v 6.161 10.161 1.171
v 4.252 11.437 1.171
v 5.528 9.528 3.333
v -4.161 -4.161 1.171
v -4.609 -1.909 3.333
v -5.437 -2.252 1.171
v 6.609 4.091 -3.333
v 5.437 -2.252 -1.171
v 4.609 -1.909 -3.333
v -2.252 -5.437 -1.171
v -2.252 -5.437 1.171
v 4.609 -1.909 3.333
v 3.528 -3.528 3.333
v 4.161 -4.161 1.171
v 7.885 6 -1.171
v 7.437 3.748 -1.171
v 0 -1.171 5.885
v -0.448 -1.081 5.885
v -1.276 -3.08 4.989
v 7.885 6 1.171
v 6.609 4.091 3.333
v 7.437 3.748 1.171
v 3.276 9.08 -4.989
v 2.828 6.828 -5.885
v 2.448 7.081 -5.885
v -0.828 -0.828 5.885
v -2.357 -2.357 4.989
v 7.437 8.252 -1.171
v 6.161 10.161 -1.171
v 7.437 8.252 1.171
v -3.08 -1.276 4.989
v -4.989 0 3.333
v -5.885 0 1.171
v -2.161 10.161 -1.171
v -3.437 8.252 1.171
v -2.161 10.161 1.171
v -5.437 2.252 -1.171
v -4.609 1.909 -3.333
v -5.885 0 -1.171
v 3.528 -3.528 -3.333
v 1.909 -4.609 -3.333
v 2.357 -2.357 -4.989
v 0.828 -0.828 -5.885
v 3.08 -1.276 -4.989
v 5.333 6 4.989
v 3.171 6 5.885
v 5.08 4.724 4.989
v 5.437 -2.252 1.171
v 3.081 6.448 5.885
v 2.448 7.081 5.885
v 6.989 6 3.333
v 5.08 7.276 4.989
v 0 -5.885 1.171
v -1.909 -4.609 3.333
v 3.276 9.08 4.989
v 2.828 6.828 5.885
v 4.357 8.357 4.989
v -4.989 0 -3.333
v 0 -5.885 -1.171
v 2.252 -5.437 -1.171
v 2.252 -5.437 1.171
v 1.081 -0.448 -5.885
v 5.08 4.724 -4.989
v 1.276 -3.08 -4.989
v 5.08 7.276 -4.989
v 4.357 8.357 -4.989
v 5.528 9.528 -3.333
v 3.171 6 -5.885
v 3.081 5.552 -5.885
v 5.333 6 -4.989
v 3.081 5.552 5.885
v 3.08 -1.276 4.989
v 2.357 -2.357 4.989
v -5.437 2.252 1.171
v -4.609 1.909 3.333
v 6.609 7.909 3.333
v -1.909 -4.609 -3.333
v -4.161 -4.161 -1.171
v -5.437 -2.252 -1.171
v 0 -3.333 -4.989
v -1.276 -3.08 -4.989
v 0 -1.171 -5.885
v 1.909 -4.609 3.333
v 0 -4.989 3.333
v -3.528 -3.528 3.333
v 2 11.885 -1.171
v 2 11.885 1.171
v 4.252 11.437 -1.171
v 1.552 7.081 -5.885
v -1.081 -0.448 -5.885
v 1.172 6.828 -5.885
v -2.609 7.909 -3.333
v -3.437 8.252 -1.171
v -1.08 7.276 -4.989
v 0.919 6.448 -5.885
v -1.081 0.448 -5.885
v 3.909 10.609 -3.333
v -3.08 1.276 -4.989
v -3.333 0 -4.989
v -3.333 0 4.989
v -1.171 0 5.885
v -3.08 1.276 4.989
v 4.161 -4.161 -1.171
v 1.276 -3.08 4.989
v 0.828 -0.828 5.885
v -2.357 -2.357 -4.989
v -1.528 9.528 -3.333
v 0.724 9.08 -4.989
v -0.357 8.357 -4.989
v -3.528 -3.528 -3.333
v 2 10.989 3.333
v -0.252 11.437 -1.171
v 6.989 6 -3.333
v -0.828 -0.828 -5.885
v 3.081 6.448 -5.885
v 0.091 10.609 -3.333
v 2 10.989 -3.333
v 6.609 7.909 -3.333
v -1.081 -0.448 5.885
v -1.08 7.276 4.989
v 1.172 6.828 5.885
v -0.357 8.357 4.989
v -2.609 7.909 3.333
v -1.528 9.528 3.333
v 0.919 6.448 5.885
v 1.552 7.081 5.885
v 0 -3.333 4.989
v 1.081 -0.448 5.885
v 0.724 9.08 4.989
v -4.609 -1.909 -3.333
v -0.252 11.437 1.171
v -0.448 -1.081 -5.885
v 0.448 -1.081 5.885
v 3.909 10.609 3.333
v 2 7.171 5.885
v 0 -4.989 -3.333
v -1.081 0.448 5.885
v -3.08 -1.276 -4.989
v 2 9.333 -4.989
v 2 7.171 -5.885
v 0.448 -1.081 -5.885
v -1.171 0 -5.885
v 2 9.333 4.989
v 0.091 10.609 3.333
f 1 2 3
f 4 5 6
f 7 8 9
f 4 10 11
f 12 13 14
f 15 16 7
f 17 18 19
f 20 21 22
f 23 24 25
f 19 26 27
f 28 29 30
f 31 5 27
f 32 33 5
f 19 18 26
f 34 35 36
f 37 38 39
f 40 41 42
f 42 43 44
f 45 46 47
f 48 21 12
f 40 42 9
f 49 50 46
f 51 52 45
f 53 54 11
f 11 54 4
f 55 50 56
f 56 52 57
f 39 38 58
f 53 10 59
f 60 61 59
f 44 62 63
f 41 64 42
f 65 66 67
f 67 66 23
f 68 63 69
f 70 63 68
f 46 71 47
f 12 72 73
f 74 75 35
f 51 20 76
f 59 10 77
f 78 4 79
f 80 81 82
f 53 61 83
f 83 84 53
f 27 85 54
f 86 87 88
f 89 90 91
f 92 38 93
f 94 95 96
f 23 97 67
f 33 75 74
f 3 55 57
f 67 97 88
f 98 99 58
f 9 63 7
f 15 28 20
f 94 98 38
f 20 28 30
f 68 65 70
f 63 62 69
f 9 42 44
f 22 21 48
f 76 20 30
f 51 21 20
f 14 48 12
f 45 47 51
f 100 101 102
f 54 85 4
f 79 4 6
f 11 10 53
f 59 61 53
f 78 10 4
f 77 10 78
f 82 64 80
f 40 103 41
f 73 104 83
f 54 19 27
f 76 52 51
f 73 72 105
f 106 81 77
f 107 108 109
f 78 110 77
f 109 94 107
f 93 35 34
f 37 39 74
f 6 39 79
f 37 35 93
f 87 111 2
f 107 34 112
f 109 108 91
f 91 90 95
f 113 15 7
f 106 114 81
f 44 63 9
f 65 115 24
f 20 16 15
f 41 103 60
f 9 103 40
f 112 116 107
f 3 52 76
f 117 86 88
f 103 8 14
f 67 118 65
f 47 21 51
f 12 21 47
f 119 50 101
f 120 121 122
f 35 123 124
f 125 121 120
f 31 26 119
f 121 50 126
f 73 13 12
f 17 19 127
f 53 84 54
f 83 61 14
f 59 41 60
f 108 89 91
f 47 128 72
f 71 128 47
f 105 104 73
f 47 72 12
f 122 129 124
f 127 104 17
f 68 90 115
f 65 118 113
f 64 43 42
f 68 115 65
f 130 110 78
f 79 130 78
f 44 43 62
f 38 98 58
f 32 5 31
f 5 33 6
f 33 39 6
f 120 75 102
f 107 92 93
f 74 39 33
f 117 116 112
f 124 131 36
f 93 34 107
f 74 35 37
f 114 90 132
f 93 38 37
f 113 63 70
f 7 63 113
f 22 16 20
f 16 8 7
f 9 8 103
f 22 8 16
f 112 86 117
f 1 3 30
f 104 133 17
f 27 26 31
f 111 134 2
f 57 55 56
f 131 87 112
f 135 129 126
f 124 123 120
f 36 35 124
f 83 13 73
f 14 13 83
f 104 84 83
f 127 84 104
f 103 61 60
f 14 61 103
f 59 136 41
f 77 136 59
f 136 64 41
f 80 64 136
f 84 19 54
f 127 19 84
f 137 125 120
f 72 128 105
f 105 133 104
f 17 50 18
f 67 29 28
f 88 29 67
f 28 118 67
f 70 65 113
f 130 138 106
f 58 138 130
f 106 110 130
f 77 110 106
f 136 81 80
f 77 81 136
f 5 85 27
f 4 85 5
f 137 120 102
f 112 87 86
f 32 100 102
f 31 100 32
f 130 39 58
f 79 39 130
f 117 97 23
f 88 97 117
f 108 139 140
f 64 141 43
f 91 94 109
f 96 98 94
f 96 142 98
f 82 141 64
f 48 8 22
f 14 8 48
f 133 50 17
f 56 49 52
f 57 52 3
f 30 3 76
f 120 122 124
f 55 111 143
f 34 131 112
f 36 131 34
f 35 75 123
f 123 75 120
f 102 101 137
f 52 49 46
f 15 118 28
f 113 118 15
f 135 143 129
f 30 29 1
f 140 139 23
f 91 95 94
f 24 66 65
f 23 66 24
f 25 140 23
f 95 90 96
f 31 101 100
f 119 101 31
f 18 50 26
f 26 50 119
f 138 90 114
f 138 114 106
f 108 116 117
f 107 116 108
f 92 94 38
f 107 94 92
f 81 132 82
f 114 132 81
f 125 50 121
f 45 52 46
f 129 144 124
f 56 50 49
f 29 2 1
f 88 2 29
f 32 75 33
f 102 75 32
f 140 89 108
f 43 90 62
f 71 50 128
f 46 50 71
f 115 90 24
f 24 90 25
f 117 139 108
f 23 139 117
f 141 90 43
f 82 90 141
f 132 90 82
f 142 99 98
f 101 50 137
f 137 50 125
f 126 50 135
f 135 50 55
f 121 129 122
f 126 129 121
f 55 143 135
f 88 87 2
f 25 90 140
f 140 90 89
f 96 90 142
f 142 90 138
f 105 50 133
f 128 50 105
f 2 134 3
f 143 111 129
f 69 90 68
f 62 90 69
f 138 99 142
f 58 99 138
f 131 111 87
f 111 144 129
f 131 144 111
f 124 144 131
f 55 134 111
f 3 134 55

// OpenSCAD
module A_Pipe(r1,r2,p1,p2,fn=16) {
  $fn=fn;
  
  hull(){
    translate(p1)
      sphere(r1);
    translate(p2)
      sphere(r2);
  }
}

module B_MainFrame() {
  A_Pipe(6,6,[0,0,0],[2,6,0]);
}

module W_Wheel() {
  circle(102.02541);
}

module Z_Main() {
  B_MainFrame();
}

Z_Main();
